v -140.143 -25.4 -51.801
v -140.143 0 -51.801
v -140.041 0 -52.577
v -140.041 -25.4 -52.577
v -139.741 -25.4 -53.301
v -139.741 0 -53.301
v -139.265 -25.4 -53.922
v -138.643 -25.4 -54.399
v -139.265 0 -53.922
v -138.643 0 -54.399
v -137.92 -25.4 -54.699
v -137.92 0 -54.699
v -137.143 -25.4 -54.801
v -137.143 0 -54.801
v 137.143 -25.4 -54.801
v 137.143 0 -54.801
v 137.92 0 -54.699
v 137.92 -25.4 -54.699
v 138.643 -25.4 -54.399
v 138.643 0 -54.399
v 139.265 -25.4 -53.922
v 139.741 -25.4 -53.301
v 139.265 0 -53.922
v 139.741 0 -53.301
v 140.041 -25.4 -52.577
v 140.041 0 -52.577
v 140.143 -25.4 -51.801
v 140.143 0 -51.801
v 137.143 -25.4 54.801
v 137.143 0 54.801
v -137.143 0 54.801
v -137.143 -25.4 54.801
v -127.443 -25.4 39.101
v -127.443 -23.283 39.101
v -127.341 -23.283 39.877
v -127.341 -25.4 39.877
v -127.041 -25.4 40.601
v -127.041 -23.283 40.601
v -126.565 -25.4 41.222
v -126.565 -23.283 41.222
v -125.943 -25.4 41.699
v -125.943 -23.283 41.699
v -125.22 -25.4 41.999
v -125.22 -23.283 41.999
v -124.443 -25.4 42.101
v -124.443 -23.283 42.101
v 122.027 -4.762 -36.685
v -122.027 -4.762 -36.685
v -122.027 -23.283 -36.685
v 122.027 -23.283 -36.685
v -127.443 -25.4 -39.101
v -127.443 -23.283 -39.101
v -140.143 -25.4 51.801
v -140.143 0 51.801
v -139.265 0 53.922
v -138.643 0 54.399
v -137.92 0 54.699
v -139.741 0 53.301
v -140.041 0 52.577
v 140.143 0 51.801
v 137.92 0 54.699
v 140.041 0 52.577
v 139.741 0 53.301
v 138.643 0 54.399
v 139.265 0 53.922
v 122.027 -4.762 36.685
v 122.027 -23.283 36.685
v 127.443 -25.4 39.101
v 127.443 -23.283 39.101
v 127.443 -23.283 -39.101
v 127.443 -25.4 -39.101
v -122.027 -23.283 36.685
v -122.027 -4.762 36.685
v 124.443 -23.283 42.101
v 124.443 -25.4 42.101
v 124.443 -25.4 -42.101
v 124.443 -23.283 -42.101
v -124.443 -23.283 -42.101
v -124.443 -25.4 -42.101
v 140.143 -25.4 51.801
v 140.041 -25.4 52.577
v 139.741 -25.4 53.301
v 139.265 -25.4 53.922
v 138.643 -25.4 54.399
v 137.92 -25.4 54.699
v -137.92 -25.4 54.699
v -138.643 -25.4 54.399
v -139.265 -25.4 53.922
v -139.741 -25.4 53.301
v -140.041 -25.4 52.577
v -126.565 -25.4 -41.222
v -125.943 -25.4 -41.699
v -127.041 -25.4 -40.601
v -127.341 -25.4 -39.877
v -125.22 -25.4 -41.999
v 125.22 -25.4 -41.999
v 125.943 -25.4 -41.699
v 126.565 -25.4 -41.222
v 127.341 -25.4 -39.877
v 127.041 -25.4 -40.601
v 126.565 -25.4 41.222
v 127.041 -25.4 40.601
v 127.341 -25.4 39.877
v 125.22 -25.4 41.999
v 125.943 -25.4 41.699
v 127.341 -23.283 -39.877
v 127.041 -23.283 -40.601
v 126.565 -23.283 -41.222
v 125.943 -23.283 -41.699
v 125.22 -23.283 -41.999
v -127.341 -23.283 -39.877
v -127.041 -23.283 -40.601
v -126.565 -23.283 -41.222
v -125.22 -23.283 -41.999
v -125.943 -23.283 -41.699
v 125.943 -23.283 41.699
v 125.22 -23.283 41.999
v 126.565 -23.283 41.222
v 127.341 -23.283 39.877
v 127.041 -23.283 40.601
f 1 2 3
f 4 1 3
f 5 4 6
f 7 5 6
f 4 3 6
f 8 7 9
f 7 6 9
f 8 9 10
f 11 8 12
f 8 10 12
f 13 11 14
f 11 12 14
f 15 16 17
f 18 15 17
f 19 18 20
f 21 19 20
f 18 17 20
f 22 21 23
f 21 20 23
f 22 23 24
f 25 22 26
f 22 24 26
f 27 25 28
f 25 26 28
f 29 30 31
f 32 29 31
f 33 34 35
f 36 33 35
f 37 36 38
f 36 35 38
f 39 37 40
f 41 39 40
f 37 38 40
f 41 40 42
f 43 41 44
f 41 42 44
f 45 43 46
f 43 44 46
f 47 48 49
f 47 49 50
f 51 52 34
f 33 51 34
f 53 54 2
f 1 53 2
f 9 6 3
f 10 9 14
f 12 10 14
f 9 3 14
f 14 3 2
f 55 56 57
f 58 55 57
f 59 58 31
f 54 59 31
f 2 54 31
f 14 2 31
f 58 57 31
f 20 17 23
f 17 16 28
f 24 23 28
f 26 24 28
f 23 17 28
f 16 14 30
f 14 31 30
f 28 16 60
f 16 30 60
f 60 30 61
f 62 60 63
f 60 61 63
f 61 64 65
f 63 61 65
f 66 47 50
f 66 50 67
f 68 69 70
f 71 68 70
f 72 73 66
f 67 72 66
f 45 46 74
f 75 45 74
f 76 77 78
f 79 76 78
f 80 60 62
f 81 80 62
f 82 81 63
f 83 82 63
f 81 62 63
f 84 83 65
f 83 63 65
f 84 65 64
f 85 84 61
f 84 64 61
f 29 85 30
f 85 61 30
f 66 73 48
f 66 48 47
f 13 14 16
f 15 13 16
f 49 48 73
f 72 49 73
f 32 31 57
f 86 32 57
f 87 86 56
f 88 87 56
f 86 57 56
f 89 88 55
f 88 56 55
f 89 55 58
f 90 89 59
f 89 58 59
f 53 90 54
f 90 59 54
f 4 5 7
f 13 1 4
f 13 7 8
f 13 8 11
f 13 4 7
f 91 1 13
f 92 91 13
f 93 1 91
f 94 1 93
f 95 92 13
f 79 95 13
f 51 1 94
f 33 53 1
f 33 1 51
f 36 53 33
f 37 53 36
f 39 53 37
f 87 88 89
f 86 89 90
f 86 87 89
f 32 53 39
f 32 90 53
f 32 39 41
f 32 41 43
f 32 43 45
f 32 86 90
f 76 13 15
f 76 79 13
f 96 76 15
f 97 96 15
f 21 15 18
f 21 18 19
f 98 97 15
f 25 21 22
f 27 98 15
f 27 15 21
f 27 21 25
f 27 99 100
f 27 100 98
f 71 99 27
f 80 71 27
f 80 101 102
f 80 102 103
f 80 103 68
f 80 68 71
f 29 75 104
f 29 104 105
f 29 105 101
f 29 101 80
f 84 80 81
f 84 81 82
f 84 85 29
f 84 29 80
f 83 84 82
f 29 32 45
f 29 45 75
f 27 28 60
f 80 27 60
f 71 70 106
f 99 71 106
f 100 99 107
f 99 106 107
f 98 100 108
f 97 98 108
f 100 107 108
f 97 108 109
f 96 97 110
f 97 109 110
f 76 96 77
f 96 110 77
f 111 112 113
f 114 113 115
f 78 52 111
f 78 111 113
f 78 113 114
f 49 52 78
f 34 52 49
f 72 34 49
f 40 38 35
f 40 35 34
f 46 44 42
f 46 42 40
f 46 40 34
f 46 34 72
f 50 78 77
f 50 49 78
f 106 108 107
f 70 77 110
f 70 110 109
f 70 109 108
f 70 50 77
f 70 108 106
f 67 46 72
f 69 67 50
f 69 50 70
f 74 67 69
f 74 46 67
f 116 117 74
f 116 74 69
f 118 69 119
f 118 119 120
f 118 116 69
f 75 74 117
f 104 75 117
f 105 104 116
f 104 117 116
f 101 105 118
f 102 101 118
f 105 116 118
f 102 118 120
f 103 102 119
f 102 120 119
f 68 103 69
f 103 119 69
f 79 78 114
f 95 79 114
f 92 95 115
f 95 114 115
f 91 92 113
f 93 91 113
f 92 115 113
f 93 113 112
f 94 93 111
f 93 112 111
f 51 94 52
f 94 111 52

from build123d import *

# Parameters (mm, degrees)
F1_DEPTH = 25.4
F0_W     = 244.054224
F0_H     = 73.369068
F2_DEPTH = 23.283333
F3_DEPTH = 4.7625


with BuildPart() as f1:
    # F0 (on Front) → F1 (new body)
    with BuildSketch(Plane.XZ):
        with BuildLine():
            Line((137.143306, 54.800729), (-137.143306, 54.800729))
            ThreePointArc((-137.143306, 54.800729), (-139.264627, 53.922049), (-140.143306, 51.800729))
            Line((-140.143306, 51.800729), (-140.143306, -51.800729))
            ThreePointArc((-140.143306, -51.800729), (-139.264627, -53.922049), (-137.143306, -54.800729))
            Line((-137.143306, -54.800729), (137.143306, -54.800729))
            ThreePointArc((137.143306, -54.800729), (139.264627, -53.922049), (140.143306, -51.800729))
            Line((140.143306, -51.800729), (140.143306, 51.800729))
            ThreePointArc((140.143306, 51.800729), (139.264627, 53.922049), (137.143306, 54.800729))
        make_face()
        with BuildLine():
            ThreePointArc((-127.443306, 39.100729), (-126.564627, 41.222049), (-124.443306, 42.100729))
            Line((-124.443306, 42.100729), (124.443306, 42.100729))
            ThreePointArc((124.443306, 42.100729), (126.564627, 41.222049), (127.443306, 39.100729))
            Line((127.443306, 39.100729), (127.443306, -39.100729))
            ThreePointArc((127.443306, -39.100729), (126.564627, -41.222049), (124.443306, -42.100729))
            Line((124.443306, -42.100729), (-124.443306, -42.100729))
            ThreePointArc((-124.443306, -42.100729), (-126.564627, -41.222049), (-127.443306, -39.100729))
            Line((-127.443306, -39.100729), (-127.443306, 39.100729))
        make_face(mode=Mode.SUBTRACT)
    extrude(amount=F1_DEPTH)

    # F0 (on Front) → F2 (join)
    with BuildSketch(Plane.XZ):
        with BuildLine():
            Line((124.443306, 42.100729), (-124.443306, 42.100729))
            ThreePointArc((-124.443306, 42.100729), (-126.564627, 41.222049), (-127.443306, 39.100729))
            Line((-127.443306, 39.100729), (-127.443306, -39.100729))
            ThreePointArc((-127.443306, -39.100729), (-126.564627, -41.222049), (-124.443306, -42.100729))
            Line((-124.443306, -42.100729), (124.443306, -42.100729))
            ThreePointArc((124.443306, -42.100729), (126.564627, -41.222049), (127.443306, -39.100729))
            Line((127.443306, -39.100729), (127.443306, 39.100729))
            ThreePointArc((127.443306, 39.100729), (126.564627, 41.222049), (124.443306, 42.100729))
        make_face()
        Rectangle(F0_W, F0_H, mode=Mode.SUBTRACT)
    extrude(amount=F2_DEPTH)

    # F0 (on Front) → F3 (join)
    with BuildSketch(Plane.XZ):
        Rectangle(F0_W, F0_H)
    extrude(amount=F3_DEPTH)


solid = f1.part
